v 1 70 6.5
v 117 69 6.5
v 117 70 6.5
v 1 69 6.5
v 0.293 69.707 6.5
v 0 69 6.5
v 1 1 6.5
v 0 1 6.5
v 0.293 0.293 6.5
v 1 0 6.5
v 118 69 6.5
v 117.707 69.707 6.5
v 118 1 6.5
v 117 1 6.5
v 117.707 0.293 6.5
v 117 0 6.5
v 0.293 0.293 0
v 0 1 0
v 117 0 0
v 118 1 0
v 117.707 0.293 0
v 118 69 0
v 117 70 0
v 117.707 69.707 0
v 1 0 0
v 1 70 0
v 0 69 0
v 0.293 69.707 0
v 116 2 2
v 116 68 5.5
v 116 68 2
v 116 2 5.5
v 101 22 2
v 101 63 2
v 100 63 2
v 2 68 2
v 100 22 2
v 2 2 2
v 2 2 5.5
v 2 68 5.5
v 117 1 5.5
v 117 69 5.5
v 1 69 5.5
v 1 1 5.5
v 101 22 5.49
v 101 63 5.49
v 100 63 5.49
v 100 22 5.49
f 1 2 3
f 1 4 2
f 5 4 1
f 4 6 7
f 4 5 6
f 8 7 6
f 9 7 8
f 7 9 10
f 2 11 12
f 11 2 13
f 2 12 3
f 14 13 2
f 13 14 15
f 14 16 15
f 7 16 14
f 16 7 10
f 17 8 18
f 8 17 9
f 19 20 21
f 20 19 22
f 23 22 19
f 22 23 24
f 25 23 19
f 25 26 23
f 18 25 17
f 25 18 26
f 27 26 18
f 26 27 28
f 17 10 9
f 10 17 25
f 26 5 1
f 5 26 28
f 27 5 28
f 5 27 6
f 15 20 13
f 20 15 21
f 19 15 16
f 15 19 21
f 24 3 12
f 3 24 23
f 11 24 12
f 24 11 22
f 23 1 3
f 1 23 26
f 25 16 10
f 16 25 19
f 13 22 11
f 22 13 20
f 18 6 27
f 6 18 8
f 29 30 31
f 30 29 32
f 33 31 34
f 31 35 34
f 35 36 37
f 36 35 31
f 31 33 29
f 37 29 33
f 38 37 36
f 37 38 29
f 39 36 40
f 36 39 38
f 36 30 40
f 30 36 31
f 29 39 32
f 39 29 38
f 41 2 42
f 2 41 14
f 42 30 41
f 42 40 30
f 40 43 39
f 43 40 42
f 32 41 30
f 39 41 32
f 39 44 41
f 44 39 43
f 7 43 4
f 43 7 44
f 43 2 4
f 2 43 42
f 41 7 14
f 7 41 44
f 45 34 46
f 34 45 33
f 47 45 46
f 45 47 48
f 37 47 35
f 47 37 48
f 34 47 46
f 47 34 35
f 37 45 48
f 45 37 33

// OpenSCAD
use <MCAD/boxes.scad>
$fa=1;
$fs=0.8;

wall_thickness = 2; 

inner_length = 98; // x
inner_width = 66; // y
inner_height=3.5; // z
lid_step = 1;
divider = 1;
regulator_length = 15;
regulator_width = 20;
regulator_height = 10;
cable_opening = 5;


box_radius = 1;

outer_length = wall_thickness + inner_length + wall_thickness;
outer_width = wall_thickness + inner_width + wall_thickness;
outer_height = wall_thickness + inner_height + lid_step;  

inner_ext_length = inner_length + divider + regulator_length;
outer_ext_length = wall_thickness + inner_ext_length + wall_thickness;

outer_ext_height = wall_thickness + regulator_height + lid_step;

divider_width = inner_width - cable_opening - regulator_width;

module main_box() {
    difference() {
           
        translate([outer_ext_length/2,outer_width/2,outer_height/2])
            roundedBox(size=[outer_ext_length,outer_width,outer_height],radius=box_radius,sidesonly=true);

        //inner box
        translate([wall_thickness,wall_thickness,wall_thickness])
            cube([inner_ext_length,inner_width,outer_height]);
        //lid step
        translate([wall_thickness-1, wall_thickness-1, outer_height-1])
            cube([inner_ext_length+lid_step*2,inner_width+lid_step*2,lid_step+1]);

    }
    
}

main_box();
//divider
translate([wall_thickness+inner_length, wall_thickness + regulator_width, wall_thickness-0.01])
    cube([divider,divider_width,inner_height]);
